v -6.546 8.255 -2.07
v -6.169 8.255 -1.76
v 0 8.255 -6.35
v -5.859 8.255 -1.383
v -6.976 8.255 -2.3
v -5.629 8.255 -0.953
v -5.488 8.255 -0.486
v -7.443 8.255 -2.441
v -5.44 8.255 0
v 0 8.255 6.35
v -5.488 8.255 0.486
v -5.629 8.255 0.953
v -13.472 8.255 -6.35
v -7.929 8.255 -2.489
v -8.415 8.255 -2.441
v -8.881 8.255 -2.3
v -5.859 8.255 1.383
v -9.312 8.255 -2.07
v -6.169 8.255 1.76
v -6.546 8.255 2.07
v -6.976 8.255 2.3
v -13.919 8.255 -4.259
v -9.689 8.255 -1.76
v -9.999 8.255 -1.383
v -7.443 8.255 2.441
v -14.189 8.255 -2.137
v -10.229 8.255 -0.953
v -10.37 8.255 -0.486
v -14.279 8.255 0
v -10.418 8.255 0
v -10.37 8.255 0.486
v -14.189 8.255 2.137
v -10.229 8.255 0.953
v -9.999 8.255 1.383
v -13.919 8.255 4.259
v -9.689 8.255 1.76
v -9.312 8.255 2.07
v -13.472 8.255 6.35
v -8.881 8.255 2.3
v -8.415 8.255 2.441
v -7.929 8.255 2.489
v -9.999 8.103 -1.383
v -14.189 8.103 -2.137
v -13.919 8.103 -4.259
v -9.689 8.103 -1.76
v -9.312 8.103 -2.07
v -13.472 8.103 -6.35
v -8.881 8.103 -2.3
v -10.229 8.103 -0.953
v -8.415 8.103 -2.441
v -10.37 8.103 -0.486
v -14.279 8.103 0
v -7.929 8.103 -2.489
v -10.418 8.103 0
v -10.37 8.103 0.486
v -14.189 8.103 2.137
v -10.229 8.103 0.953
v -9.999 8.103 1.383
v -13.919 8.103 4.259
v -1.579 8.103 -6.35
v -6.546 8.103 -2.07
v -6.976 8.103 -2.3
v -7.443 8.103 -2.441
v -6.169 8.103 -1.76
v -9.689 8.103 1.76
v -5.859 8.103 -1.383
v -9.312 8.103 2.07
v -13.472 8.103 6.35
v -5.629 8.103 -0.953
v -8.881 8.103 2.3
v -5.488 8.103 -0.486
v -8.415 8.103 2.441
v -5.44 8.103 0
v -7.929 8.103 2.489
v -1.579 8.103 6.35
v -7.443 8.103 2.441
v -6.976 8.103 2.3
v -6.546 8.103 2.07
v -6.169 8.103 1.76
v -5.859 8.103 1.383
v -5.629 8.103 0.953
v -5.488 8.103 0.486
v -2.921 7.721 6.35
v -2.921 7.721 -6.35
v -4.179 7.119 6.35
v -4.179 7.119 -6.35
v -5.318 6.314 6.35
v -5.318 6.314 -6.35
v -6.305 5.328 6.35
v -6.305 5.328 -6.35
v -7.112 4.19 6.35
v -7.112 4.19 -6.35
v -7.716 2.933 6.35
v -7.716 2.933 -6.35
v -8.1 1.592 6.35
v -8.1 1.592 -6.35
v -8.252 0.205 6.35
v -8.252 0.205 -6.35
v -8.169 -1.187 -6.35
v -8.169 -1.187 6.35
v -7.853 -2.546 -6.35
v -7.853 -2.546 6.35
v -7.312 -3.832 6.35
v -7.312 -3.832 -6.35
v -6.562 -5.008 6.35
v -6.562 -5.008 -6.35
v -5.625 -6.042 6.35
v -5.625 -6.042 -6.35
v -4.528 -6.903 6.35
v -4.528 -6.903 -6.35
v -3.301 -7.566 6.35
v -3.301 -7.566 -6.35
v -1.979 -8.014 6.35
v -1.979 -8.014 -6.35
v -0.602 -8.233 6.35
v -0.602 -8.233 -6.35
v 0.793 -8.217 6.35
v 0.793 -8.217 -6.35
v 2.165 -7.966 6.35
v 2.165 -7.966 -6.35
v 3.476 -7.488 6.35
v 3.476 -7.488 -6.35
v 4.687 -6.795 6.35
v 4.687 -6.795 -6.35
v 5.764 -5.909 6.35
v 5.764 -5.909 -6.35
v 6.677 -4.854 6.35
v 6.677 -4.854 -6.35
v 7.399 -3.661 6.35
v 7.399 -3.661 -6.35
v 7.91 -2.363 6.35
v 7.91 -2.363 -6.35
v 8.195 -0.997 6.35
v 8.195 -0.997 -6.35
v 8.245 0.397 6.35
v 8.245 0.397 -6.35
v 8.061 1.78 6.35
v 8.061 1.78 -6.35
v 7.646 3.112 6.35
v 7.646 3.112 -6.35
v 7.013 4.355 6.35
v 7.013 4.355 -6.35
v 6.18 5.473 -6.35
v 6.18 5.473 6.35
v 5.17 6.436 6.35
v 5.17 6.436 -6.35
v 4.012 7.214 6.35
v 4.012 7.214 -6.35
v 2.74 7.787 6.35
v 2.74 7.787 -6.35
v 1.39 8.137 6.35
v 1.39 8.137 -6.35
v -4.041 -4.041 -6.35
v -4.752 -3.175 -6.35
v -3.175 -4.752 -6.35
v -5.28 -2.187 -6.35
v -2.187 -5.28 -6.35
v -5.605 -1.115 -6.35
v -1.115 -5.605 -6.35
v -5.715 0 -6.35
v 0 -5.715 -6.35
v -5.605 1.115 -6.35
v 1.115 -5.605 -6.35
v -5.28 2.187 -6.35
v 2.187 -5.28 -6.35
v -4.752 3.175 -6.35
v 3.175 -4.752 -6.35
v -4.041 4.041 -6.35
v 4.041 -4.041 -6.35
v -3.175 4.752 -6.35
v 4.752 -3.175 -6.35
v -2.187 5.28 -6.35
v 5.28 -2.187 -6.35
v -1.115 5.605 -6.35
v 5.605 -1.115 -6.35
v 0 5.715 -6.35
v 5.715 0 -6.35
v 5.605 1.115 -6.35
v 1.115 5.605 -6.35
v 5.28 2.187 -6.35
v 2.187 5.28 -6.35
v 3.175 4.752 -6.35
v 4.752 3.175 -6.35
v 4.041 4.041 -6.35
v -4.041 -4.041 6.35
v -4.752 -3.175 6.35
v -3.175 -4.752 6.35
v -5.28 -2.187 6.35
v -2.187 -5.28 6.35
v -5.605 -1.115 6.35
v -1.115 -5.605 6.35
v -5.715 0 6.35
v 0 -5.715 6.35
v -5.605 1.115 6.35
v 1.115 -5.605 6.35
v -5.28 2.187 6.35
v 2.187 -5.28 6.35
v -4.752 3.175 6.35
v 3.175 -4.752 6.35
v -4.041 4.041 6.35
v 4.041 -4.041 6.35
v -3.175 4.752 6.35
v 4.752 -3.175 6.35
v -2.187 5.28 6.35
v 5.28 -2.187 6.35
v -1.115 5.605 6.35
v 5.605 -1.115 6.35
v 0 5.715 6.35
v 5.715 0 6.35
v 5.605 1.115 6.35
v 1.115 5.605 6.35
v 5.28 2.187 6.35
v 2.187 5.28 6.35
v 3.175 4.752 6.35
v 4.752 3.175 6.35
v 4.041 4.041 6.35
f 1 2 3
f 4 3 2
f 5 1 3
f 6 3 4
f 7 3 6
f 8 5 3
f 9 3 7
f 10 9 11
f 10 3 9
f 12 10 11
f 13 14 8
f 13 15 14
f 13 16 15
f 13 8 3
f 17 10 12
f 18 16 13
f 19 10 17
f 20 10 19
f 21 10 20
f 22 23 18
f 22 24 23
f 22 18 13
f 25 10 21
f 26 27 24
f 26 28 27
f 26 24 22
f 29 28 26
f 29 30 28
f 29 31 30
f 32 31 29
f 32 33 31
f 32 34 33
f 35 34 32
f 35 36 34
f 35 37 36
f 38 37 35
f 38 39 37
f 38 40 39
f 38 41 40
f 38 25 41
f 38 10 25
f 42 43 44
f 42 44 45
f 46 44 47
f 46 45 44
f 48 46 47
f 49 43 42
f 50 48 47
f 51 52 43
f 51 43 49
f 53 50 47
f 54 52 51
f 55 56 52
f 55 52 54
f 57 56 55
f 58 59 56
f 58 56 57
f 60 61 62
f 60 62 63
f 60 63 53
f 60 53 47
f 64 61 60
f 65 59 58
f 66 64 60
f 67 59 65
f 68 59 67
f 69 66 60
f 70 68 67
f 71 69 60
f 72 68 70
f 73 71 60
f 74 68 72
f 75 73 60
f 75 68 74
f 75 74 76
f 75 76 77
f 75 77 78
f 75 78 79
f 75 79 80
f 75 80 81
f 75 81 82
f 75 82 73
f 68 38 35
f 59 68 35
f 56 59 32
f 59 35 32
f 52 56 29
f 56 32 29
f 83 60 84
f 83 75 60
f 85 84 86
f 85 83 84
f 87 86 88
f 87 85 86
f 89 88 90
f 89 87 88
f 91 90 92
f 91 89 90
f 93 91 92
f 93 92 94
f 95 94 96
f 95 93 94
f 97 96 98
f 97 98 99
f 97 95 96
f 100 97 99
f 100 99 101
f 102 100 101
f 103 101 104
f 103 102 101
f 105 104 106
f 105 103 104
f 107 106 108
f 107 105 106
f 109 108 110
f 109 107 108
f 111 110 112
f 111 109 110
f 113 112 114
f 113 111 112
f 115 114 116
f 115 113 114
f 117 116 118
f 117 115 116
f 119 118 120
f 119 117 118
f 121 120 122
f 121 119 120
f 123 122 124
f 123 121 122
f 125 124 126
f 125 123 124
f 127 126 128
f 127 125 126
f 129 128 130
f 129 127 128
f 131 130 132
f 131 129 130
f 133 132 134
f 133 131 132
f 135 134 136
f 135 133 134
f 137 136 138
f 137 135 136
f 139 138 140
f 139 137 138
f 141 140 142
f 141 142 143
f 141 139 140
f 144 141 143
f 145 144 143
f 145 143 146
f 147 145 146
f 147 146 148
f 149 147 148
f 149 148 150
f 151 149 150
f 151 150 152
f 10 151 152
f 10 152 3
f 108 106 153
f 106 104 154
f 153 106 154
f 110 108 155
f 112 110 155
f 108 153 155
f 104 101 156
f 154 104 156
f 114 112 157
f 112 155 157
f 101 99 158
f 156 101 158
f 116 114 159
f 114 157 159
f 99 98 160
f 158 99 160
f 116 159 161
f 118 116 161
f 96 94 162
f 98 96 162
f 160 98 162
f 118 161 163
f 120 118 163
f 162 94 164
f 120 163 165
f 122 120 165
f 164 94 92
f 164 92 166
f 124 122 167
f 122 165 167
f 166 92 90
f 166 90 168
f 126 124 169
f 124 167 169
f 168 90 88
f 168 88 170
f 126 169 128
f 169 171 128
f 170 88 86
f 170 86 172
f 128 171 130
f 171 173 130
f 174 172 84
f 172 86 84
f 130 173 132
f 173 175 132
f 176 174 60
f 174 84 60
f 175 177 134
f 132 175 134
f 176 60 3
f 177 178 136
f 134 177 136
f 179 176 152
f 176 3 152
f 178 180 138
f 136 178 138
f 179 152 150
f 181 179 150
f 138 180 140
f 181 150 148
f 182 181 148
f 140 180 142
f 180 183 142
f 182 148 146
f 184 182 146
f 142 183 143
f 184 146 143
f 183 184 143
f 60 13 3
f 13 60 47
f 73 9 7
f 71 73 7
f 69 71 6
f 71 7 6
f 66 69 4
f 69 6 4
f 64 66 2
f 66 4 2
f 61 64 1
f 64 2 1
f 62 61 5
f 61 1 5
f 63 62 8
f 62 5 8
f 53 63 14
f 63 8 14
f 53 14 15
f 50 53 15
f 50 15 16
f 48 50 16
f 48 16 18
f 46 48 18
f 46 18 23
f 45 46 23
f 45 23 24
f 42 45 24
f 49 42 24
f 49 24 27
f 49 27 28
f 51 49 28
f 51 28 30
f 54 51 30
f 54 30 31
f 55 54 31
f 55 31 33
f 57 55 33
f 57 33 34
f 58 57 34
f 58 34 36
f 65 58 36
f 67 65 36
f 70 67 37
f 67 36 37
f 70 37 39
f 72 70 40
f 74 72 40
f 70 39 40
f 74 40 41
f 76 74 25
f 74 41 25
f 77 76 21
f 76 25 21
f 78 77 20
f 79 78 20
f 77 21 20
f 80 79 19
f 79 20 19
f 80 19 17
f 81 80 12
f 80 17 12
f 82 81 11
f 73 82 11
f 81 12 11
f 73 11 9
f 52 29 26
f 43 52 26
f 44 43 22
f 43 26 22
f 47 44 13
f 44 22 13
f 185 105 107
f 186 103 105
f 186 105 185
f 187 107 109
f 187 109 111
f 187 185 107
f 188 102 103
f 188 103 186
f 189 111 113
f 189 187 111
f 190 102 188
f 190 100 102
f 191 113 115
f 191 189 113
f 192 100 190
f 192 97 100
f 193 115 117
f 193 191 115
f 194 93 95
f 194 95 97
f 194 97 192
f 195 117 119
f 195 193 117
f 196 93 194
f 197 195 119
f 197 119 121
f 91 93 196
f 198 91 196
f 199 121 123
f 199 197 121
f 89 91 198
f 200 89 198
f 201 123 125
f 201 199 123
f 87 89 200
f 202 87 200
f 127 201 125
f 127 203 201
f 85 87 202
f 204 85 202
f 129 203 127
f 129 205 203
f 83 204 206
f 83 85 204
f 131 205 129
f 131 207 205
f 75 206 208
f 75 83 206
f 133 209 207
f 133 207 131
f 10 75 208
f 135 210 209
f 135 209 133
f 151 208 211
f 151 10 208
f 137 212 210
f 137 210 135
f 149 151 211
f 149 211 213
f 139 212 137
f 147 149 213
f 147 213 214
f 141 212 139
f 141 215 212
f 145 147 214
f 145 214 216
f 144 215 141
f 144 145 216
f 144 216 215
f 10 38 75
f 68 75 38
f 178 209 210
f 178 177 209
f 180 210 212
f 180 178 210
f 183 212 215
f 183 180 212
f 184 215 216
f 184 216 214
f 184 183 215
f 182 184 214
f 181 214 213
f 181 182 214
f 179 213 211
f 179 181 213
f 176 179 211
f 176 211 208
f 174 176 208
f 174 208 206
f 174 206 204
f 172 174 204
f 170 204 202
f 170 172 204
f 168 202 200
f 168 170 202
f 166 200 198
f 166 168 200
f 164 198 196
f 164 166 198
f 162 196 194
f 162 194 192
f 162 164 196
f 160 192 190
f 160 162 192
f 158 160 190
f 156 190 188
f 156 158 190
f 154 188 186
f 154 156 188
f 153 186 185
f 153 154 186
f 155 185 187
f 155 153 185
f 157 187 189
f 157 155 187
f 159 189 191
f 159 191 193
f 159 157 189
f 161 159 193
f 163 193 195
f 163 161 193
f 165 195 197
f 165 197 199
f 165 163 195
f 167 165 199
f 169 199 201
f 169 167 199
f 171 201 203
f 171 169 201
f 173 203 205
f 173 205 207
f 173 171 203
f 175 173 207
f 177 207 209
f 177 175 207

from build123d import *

# Parameters (mm, degrees)
SKETCH1_R           = 8.255
SKETCH1_R_2         = 5.715
BOSS_EXTRUDE1_DEPTH = 6.35
CUT_EXTRUDE1_REACH  = 18.51
SKETCH5_R           = 2.4892


with BuildPart() as part:
    # Sketch1 → Boss-Extrude1 (new body, symmetric)
    with BuildSketch(Plane.XY):
        Circle(SKETCH1_R)
        Circle(SKETCH1_R_2, mode=Mode.SUBTRACT)
        with BuildLine():
            ThreePointArc((-1.578891459, 8.1026), (-0.793114746, 8.216811669), (0, 8.255))
            Line((0, 8.255), (-14.278891459, 8.255))
            Line((-14.278891459, 8.255), (-14.278891459, 8.1026))
            Line((-14.278891459, 8.1026), (-1.578891459, 8.1026))
        make_face()
    extrude(amount=BOSS_EXTRUDE1_DEPTH, both=True)

    # Sketch5 → Cut-Extrude1 (cut, up to next)
    with BuildSketch(Plane(origin=(0, 8.255, 0), x_dir=(1, 0, 0), z_dir=(0, 1, 0)), mode=Mode.PRIVATE) as cut_extrude1_sk1:
        with BuildLine():
            ThreePointArc((-14.278891459, -1.01e-07), (-14.076445751, 3.200508979), (-13.472335708, 6.35))
            Line((-13.472335708, 6.35), (-14.278891459, 6.35))
            Line((-14.278891459, 6.35), (-14.278891459, -1.01e-07))
        make_face()
    cut_extrude1_tool1 = extrude(cut_extrude1_sk1.sketch, amount=-CUT_EXTRUDE1_REACH, mode=Mode.PRIVATE) & part.part
    add(cut_extrude1_tool1.solids().sort_by_distance((-14.037598, 8.255, -4.767585))[0], mode=Mode.SUBTRACT)
    # Sketch5 → Cut-Extrude1 (cut, up to next)
    with BuildSketch(Plane(origin=(0, 8.255, 0), x_dir=(1, 0, 0), z_dir=(0, 1, 0)), mode=Mode.PRIVATE) as cut_extrude1_sk2:
        with BuildLine():
            ThreePointArc((-13.472335708, -6.35), (-14.076445738, -3.200509079), (-14.278891459, -1.01e-07))
            Line((-14.278891459, -1.01e-07), (-14.278891459, -6.35))
            Line((-14.278891459, -6.35), (-13.472335708, -6.35))
        make_face()
    cut_extrude1_tool2 = extrude(cut_extrude1_sk2.sketch, amount=-CUT_EXTRUDE1_REACH, mode=Mode.PRIVATE) & part.part
    add(cut_extrude1_tool2.solids().sort_by_distance((-14.037598, 8.255, 4.767585))[0], mode=Mode.SUBTRACT)
    # Sketch5 → Cut-Extrude1 (cut, up to next)
    with BuildSketch(Plane(origin=(0, 8.255, 0), x_dir=(1, 0, 0), z_dir=(0, 1, 0)), mode=Mode.PRIVATE) as cut_extrude1_sk3:
        with Locations((-7.928891459, 0)):
            Circle(SKETCH5_R)
    cut_extrude1_tool3 = extrude(cut_extrude1_sk3.sketch, amount=-CUT_EXTRUDE1_REACH, mode=Mode.PRIVATE) & part.part
    add(cut_extrude1_tool3.solids().sort_by_distance((-7.928891, 8.255, 0))[0], mode=Mode.SUBTRACT)


solid = part.part
